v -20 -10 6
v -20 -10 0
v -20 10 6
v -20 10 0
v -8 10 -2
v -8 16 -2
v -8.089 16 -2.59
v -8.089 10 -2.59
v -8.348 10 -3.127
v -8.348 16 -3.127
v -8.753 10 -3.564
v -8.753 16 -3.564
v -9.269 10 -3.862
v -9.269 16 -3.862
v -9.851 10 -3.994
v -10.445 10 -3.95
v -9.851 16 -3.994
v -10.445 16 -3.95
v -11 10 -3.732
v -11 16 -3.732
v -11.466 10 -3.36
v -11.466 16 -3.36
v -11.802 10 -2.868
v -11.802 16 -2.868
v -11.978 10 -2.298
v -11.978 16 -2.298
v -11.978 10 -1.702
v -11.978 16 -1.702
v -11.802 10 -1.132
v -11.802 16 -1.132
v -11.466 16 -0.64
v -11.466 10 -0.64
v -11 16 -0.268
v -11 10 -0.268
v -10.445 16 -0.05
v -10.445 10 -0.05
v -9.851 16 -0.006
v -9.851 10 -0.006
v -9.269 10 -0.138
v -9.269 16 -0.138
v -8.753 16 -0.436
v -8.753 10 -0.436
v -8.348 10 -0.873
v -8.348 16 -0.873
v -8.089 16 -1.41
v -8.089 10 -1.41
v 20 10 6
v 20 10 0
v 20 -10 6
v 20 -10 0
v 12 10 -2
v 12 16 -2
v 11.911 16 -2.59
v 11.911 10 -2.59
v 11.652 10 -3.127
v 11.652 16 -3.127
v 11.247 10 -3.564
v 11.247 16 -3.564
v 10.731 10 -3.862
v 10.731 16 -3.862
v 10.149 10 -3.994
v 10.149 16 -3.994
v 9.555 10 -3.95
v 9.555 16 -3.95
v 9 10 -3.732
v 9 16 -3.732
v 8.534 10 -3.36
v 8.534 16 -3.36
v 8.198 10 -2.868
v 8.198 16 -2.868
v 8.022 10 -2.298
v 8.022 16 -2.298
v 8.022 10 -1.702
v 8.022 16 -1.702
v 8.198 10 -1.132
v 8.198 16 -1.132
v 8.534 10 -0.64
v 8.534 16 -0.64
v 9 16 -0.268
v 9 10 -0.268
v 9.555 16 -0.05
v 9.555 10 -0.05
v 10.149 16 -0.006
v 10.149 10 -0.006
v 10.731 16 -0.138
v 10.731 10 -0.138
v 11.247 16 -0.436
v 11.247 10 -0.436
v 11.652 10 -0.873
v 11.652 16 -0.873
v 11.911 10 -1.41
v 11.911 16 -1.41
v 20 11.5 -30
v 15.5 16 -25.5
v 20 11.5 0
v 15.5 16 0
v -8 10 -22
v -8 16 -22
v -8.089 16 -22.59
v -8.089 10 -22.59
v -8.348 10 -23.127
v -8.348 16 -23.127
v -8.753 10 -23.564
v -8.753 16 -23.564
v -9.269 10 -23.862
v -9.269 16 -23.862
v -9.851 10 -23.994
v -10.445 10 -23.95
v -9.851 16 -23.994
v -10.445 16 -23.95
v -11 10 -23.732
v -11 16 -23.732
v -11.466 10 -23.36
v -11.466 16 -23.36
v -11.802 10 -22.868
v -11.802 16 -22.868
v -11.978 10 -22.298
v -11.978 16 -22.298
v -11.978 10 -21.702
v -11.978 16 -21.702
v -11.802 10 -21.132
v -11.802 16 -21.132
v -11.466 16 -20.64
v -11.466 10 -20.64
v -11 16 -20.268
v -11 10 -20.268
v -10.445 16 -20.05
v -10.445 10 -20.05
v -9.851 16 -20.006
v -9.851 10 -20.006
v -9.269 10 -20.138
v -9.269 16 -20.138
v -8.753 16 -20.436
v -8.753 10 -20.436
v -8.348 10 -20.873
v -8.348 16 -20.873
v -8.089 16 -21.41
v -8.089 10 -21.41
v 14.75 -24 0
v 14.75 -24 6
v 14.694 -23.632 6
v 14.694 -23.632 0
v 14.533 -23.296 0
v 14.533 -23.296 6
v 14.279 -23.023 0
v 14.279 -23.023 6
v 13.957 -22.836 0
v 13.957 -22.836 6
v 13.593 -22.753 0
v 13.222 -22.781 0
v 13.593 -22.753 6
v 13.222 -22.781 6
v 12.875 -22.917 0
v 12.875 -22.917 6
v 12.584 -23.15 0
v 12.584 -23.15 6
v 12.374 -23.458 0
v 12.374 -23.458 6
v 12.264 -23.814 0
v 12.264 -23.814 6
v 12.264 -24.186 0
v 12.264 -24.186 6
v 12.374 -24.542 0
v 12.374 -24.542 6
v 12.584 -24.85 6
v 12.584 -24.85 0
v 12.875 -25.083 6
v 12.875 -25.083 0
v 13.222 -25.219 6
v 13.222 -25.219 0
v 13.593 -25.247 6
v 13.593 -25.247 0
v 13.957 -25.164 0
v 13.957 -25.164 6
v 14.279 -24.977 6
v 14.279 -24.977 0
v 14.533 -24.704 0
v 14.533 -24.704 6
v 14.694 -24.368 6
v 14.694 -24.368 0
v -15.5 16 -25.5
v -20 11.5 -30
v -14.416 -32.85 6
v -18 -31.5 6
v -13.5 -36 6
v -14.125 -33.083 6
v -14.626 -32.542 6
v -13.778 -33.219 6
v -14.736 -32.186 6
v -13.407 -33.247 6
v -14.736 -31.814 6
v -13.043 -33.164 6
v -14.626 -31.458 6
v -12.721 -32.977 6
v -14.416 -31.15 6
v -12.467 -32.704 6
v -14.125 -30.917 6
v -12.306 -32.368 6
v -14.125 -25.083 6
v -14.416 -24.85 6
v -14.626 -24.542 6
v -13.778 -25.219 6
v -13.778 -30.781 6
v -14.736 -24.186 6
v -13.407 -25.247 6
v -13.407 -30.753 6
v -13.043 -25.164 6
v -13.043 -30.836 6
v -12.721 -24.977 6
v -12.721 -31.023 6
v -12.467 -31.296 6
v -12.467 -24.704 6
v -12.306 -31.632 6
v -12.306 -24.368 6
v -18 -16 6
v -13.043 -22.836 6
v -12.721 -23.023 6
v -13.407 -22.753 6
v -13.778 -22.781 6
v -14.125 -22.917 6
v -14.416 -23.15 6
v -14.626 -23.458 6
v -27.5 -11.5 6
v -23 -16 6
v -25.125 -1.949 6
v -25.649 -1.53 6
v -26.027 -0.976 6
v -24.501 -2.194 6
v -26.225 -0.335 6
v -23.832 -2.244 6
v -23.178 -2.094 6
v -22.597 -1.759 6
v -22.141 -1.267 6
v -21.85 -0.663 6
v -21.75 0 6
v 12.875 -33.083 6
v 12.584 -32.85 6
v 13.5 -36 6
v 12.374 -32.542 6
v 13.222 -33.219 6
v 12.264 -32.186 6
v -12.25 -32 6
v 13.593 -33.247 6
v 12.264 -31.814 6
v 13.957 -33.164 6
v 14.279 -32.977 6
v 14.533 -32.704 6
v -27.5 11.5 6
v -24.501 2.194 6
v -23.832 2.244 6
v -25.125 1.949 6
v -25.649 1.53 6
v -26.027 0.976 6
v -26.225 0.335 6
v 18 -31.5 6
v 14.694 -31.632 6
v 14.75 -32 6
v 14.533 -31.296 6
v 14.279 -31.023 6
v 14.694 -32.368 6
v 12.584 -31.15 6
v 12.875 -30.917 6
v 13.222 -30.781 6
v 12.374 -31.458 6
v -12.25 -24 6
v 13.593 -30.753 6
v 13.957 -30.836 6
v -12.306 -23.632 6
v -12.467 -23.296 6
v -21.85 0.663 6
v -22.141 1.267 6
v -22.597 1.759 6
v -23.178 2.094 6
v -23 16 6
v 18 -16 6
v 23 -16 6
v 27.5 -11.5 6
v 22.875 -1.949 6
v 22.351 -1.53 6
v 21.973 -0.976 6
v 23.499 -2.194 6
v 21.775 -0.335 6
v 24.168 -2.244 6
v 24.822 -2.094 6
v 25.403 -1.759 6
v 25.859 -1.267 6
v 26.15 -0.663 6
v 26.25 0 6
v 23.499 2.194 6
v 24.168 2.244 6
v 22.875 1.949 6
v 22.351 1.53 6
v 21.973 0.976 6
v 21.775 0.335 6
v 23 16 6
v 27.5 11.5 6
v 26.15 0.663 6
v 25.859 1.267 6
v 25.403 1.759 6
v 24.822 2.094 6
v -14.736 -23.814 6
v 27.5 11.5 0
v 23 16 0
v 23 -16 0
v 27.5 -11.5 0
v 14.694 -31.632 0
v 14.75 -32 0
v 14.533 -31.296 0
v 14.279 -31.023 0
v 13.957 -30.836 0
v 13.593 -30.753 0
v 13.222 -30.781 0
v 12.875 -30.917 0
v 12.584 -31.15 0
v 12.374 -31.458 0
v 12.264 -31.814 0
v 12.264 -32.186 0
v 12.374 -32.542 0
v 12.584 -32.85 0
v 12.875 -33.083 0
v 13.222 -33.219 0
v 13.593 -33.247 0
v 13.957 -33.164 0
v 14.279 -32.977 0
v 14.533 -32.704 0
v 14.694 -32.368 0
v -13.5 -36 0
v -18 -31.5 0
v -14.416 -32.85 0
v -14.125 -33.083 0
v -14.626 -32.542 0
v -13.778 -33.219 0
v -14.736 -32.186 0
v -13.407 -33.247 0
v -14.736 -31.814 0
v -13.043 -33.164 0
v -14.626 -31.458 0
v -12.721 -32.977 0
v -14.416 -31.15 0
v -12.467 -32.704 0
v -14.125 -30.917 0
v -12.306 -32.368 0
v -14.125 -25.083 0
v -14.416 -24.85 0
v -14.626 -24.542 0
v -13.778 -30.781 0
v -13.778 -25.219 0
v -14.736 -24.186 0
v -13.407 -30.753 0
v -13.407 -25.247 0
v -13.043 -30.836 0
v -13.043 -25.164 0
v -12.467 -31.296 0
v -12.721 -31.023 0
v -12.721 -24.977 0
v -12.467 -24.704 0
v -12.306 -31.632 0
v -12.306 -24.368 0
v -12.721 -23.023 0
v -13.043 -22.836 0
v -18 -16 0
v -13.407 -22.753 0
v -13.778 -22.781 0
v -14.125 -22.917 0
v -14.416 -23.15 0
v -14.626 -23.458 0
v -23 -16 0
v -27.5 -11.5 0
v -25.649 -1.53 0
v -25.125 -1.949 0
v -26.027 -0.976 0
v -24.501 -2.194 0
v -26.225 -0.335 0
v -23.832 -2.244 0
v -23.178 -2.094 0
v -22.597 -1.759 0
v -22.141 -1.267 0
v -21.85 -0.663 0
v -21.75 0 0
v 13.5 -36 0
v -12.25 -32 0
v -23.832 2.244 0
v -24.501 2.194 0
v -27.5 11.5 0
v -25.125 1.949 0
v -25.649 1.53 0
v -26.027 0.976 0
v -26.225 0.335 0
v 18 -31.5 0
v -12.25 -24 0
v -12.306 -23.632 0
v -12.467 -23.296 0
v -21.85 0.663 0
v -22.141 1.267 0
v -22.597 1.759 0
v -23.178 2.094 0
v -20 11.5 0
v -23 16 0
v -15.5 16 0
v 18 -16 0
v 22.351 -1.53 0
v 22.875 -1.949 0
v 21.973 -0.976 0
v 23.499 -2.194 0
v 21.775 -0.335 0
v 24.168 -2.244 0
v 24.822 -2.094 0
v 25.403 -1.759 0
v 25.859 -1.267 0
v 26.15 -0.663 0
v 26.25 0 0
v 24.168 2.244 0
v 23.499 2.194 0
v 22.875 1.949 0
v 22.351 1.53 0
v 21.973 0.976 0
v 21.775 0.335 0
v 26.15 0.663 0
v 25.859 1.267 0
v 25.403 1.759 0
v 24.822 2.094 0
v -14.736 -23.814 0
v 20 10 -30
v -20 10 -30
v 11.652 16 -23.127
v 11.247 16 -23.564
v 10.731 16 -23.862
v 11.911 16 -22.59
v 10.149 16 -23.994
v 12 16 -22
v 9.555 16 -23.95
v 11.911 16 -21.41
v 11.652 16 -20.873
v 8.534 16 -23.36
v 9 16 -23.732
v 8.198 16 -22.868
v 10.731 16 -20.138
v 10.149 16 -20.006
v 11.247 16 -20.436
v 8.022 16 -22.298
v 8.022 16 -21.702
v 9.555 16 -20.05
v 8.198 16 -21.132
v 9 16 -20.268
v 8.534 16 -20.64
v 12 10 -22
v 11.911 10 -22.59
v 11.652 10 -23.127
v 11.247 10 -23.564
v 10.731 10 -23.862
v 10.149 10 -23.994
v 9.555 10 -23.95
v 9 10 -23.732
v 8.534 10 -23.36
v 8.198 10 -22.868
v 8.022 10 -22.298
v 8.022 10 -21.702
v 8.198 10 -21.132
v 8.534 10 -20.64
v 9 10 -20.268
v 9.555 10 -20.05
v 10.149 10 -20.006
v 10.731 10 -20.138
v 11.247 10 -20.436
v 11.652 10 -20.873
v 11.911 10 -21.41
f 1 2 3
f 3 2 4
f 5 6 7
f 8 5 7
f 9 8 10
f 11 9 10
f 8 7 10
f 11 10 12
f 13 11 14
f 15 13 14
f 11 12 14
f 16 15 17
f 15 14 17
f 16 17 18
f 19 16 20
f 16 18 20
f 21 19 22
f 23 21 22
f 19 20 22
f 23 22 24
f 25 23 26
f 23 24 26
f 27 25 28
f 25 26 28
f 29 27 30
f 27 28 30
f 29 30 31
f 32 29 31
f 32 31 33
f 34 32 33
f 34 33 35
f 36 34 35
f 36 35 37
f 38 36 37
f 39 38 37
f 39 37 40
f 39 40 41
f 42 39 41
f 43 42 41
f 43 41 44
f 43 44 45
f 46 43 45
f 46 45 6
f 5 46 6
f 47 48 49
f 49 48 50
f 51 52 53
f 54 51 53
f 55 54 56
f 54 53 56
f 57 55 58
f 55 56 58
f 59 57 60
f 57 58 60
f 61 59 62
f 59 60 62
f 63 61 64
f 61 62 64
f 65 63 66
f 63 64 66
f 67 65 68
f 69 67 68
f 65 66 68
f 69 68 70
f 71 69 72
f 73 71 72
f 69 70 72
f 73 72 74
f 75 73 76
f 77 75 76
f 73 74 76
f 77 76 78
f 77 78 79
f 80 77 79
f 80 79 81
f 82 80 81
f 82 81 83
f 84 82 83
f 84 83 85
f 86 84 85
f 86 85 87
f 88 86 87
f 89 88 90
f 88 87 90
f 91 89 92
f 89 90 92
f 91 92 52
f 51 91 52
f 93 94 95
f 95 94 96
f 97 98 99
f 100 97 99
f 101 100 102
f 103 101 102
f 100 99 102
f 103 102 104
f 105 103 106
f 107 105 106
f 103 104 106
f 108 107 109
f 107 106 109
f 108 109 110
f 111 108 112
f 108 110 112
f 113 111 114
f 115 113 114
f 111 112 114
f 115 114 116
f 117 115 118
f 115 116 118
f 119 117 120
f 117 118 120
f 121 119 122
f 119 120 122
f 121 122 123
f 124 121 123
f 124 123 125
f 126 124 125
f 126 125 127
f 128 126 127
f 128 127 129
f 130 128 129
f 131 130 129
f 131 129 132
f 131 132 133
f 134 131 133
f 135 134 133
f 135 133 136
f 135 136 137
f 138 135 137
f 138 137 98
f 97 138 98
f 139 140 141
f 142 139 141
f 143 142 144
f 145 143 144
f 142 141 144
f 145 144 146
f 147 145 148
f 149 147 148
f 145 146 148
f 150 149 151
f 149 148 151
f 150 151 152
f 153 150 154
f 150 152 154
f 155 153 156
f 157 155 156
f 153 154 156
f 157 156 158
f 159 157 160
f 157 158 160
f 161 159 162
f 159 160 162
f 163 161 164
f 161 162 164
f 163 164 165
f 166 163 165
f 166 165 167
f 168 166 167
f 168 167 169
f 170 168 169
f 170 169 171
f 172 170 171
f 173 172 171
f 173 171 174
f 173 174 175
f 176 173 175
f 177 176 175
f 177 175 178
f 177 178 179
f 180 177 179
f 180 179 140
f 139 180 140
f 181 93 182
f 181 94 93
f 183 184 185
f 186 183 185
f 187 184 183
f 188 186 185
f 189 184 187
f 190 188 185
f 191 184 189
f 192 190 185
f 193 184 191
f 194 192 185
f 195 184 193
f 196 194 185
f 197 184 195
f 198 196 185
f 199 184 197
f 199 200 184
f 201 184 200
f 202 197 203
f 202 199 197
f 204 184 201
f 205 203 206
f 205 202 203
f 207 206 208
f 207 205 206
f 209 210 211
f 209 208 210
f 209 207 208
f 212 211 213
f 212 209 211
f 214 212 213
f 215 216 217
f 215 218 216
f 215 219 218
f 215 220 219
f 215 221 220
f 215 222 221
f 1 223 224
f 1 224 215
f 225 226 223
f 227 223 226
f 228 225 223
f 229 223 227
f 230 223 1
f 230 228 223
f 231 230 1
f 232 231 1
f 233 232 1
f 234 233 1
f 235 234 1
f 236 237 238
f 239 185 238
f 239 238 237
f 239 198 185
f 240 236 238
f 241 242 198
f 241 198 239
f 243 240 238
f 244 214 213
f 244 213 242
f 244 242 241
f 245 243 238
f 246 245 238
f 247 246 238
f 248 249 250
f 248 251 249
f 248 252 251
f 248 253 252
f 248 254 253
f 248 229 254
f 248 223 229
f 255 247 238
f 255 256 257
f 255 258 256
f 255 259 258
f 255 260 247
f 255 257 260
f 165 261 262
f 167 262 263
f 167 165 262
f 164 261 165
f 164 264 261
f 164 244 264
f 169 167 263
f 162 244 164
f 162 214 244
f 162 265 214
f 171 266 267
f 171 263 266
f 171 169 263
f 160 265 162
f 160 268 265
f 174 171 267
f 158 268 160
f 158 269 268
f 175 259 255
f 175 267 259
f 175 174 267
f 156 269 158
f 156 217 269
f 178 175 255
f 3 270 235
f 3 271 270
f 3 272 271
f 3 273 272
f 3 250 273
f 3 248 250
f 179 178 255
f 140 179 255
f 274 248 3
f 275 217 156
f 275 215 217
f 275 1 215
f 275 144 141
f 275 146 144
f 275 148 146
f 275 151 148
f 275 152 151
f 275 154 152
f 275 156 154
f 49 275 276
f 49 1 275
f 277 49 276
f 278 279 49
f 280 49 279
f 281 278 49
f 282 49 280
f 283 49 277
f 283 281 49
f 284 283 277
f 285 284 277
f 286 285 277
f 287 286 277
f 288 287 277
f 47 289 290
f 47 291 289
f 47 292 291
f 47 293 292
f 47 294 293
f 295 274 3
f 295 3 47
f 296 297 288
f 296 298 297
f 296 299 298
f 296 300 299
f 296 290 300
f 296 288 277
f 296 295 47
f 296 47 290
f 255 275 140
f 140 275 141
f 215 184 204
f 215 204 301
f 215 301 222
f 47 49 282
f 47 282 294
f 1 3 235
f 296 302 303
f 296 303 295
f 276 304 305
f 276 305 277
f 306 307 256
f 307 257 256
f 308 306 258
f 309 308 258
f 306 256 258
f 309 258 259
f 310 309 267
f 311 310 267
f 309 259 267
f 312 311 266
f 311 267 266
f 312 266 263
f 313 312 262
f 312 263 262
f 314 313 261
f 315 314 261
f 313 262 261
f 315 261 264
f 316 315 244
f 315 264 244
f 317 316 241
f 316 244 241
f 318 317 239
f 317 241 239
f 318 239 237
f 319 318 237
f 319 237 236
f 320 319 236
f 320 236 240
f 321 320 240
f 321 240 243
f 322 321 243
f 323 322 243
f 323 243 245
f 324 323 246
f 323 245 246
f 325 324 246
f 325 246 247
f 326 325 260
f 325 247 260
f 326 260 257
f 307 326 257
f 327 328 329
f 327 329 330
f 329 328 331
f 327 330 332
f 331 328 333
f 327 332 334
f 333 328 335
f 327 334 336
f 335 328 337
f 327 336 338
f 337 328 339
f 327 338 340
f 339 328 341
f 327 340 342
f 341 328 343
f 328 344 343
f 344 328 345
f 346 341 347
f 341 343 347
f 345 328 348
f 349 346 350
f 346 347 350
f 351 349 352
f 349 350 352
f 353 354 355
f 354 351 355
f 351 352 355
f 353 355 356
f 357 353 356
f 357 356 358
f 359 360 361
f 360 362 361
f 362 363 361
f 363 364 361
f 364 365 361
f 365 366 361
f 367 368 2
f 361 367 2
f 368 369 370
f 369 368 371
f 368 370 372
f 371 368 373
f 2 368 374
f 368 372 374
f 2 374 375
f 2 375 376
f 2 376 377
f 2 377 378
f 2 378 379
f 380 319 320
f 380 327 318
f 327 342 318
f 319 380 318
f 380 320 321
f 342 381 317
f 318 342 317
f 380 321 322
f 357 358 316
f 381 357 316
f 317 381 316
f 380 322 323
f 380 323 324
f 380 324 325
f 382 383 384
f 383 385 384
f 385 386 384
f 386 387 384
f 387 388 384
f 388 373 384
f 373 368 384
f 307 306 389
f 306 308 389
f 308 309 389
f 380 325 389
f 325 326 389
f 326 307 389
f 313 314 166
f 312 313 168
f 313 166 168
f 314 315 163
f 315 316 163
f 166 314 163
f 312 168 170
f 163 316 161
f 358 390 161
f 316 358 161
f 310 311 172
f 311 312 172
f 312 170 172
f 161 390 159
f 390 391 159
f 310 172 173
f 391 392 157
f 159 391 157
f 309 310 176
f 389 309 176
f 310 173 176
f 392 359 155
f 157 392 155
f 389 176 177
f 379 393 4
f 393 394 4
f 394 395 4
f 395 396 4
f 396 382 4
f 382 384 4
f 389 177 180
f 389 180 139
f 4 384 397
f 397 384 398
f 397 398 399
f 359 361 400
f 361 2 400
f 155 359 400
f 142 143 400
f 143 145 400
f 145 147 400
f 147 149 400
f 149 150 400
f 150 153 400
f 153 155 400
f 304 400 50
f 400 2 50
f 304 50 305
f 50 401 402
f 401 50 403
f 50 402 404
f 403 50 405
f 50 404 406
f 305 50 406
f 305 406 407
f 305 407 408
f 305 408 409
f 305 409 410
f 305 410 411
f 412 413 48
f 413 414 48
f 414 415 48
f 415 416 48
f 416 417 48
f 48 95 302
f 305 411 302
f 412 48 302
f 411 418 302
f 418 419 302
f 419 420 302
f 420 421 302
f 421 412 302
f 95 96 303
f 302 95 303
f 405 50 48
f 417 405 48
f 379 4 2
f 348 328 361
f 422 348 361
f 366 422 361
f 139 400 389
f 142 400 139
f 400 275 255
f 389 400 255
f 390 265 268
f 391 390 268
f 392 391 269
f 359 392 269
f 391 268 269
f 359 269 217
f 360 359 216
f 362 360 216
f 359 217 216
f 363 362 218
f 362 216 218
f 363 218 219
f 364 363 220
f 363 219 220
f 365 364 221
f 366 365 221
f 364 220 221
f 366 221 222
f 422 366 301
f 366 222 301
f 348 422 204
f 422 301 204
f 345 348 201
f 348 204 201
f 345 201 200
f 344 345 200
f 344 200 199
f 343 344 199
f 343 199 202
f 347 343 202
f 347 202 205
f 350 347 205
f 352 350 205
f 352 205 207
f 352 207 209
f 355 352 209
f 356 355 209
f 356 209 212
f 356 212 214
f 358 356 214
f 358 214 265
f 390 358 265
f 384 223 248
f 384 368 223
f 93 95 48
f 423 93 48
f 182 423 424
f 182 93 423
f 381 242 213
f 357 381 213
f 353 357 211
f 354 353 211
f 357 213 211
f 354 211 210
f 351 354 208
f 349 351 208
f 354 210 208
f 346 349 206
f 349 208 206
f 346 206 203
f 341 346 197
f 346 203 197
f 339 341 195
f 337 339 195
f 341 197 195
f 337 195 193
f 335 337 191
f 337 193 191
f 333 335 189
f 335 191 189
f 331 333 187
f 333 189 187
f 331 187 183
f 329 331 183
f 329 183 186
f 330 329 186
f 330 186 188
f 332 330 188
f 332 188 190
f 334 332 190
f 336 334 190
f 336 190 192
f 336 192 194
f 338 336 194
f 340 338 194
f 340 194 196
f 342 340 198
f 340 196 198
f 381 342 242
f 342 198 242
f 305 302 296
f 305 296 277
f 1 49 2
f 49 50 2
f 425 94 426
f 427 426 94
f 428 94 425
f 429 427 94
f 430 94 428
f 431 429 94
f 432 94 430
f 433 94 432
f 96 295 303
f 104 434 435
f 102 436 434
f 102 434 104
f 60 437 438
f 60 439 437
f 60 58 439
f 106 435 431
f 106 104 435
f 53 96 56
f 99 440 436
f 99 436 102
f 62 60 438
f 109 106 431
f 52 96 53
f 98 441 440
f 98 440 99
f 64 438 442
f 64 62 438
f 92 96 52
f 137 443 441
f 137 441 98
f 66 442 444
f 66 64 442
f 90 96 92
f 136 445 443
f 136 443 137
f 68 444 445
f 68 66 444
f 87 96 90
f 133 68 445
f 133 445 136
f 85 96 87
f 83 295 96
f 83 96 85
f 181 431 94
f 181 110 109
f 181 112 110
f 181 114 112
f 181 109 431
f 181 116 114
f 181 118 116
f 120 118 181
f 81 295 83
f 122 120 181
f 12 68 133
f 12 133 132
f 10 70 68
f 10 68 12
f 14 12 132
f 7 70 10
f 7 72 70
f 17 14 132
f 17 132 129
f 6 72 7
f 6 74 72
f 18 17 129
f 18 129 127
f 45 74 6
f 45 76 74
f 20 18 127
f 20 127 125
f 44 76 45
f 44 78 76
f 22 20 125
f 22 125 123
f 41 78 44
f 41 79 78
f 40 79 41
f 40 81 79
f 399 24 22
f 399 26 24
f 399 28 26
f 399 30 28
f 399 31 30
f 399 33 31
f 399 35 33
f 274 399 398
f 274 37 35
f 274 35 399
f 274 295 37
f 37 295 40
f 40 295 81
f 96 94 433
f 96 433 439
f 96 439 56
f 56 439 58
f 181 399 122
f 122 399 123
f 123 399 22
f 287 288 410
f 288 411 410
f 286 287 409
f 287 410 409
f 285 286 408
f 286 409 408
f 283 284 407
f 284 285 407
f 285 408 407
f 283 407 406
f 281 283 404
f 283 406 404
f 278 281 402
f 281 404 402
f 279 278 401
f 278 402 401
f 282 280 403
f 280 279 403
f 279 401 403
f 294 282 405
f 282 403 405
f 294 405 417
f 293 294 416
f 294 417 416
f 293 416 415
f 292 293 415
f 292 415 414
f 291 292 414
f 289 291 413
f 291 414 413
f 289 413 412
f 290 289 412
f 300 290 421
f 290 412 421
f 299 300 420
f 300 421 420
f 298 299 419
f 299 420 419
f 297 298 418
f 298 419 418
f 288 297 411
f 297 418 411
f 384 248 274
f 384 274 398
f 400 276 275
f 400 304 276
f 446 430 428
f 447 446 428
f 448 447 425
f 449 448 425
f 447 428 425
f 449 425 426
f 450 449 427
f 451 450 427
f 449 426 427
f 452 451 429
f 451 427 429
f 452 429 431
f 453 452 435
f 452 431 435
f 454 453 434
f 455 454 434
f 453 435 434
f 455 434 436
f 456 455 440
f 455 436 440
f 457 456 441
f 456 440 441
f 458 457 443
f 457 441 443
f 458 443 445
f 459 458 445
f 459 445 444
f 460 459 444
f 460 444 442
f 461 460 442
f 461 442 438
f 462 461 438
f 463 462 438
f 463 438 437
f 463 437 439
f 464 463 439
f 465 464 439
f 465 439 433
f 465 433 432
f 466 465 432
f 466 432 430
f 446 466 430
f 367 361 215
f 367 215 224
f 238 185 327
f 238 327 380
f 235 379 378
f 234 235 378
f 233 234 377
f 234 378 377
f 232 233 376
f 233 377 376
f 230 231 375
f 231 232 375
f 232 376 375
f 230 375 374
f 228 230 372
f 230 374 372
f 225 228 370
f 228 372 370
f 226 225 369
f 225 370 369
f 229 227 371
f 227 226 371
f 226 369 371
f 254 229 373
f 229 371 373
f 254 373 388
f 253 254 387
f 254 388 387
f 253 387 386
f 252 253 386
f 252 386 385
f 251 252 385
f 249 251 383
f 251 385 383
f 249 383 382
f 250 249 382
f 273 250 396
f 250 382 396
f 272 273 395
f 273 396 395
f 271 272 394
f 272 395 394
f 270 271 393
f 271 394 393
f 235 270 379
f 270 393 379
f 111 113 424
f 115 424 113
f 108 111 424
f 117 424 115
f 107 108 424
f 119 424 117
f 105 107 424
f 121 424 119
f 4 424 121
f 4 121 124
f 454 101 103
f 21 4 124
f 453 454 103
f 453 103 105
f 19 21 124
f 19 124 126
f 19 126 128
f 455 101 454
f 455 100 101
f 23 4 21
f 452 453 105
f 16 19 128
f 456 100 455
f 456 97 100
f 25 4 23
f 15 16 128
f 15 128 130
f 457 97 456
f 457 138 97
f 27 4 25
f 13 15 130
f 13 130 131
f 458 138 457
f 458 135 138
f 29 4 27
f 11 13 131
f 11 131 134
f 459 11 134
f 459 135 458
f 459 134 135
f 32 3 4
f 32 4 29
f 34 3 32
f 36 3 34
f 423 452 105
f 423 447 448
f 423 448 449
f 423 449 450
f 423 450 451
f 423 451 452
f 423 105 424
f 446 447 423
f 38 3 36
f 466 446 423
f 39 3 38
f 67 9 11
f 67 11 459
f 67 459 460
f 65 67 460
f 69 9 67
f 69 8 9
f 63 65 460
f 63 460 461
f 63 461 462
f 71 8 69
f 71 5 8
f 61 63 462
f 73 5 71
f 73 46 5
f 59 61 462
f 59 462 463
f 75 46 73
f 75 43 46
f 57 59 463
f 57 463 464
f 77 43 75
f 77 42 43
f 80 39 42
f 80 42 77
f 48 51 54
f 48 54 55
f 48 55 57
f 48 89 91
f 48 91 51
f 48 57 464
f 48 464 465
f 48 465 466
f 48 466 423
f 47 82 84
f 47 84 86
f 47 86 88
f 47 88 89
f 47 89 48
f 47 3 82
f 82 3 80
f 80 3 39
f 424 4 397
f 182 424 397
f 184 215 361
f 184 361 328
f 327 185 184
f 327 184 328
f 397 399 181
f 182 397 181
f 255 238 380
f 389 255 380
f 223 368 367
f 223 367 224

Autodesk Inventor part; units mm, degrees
ref_plane "YZ Plane" through (0, 0, 0) normal (1, 0, 0) x (0, 1, 0)
ref_plane "XZ Plane" through (0, 0, 0) normal (0, 1, 0) x (-1, 0, 0)
ref_plane "XY Plane" through (0, 0, 0) normal (0, 0, 1) x (1, 0, 0)
sketch "Sketch1" plane through (0, 0, 0) normal (0, 0, 1) x (1, 0, 0)
  line L0 (-20, 10) -> (20, 10)
  line L1 (20, 10) -> (20, -10)
  line L2 (20, -10) -> (-20, -10)
  line L3 (-20, -10) -> (-20, 10)
  line L4 (-20, 10) -> (20, -10) construction
  line L5 (20, 10) -> (-20, -10) construction
  line L6 (-27.5, 16) -> (27.5, 16)
  line L7 (27.5, 16) -> (27.5, -16)
  line L8 (27.5, -16) -> (-27.5, -16)
  line L9 (-27.5, -16) -> (-27.5, 16)
  line L10 (-27.5, 16) -> (27.5, -16) construction
  line L11 (27.5, 16) -> (-27.5, -16) construction
  line L12 (0, 0) -> (0, 16) construction
  circle A0 centre (-24, 0) radius 2.25
  circle A1 centre (24, 0) radius 2.25
  dimension "d0" = 40
  dimension "d1" = 20
  dimension "d2" = 32
  dimension "d3" = 55
  dimension "d4" = 4.5
  dimension "d5" = 24
extrude "Extrusion1" add sketch "Sketch1" along normal blind 6
chamfer "Chamfer1" distance 4.5 angle 45 4 edges at (27.5, 16, 3) (27.5, -16, 3) (-27.5, -16, 3) (-27.5, 16, 3)
sketch "Sketch3" plane through (0, 0, 6) normal (0, 0, 1) x (1, 0, 0)
  line L0 (-23, -16) -> (23, -16) projected
  line L1 (0, -16) -> (-18, -16)
  line L2 (-18, -16) -> (-18, -36)
  line L3 (-18, -36) -> (0, -36)
  line L4 (0, -36) -> (0, -16)
  circle A0 centre (-13.5, -24) radius 1.25
  line L5 (-13.5, -24) -> (-13.5, -32) construction
  circle A1 centre (-13.5, -32) radius 1.25
  line L6 (23, -16) -> (-23, -16)
  line L7 (18, -16) -> (18, -36)
  line L8 (18, -36) -> (0, -36)
  circle A2 centre (13.5, -24) radius 1.25
  circle A3 centre (13.5, -32) radius 1.25
  line L9 (-27.5, 11.5) -> (-27.5, -11.5) projected
  point P0 (0, 0)
  dimension "d17" = 18
  dimension "d18" = 20
  dimension "d19" = 2.5
  dimension "d20" = 2.5
  dimension "d21" = 8
  dimension "d22" = 16
  dimension "d26" = 13.5
extrude "Extrusion3" add sketch "Sketch3" against normal blind 6
chamfer "Chamfer2" distance 4.5 angle 45 2 edges at (18, -36, 3) (-18, -36, 3)
sketch "Sketch6" plane through (0, 0, 0) normal (0, 0, -1) x (-1, 0, 0)
  line L0 (20, 10) -> (-20, 10) projected
  line L1 (-23, 16) -> (23, 16) projected
  line L2 (-20, 10) -> (20, 10)
  line L3 (20, 10) -> (20, 16)
  line L4 (20, 16) -> (-20, 16)
  line L5 (-20, 16) -> (-20, 10)
  point P0 (0, 0)
  dimension "d30" = 40
extrude "Extrusion4" add sketch "Sketch6" along normal blind 30
chamfer "Chamfer3" distance 4.5 angle 45 3 edges at (-20, 16, -15) (20, 16, -15) (0, 16, -30)
sketch "Sketch2" plane through (-23, 16, 0) normal (0, 1, 0) x (1, 0, 0)
  line L0 (50.5, -6) -> (50.5, 0) projected
  line L1 (50.5, -3) -> (-4.5, -3) construction
  line L2 (-4.5, 0) -> (-4.5, -6) projected
  line L3 (23, 0) -> (23, -6) construction
  line L4 (33, -3) -> (33, 2)
  circle A0 centre (33, 2) radius 2
  circle A1 centre (13, 2) radius 2
  circle A2 centre (33, 22) radius 2
  circle A3 centre (13, 22) radius 2
  dimension "d11" = 10
  dimension "d36" = 5
  dimension "d37" = 4
  dimension "d40" = 20
  dimension "d43" = 20
extrude "Extrusion2" cut sketch "Sketch2" against normal blind 10
properties part number "ServoCarrier"
